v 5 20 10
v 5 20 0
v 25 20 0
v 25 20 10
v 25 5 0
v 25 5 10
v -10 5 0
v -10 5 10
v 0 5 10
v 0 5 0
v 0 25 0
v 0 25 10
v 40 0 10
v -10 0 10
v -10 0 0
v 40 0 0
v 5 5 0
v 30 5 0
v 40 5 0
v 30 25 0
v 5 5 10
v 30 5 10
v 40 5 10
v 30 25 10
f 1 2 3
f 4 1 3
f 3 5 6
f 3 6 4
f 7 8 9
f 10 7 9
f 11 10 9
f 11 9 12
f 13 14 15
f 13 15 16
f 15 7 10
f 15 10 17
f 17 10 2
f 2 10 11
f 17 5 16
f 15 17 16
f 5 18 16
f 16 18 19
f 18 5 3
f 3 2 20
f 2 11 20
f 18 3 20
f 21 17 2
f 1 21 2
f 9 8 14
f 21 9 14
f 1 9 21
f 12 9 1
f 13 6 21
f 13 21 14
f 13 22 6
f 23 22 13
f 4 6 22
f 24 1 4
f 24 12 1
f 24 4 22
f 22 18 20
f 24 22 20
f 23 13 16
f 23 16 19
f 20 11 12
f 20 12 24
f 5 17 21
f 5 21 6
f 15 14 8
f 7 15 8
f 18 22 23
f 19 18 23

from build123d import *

# Parameters (mm, degrees)
SKETCH1_W               = 30
SKETCH1_H               = 25
BOSS_EXTRUDE1_DEPTH     = 10
SKETCH2_W               = 50
SKETCH2_H               = 5
BOSS_EXTRUDE2_DEPTH     = 10
CUT_EXTRUDE1_DEPTH      = 49.218253805
CUT_EXTRUDE1_DEPTH_BACK = 49.218253805
SKETCH3_W               = 20
SKETCH3_H               = 15


with BuildPart() as part:
    # Sketch1 → Boss-Extrude1 (new body)
    with BuildSketch(Plane.XY):
        with Locations((15, 12.5)):
            Rectangle(SKETCH1_W, SKETCH1_H)
    extrude(amount=BOSS_EXTRUDE1_DEPTH)

    # Sketch2 → Boss-Extrude2 (add)
    with BuildSketch(Plane.XY.offset(10)):
        with Locations((15, 2.5)):
            Rectangle(SKETCH2_W, SKETCH2_H)
    extrude(amount=-BOSS_EXTRUDE2_DEPTH)

    # Sketch3 → Cut-Extrude1 (cut, two sides: drawn at the far end of the back side and taken through both)
    with BuildSketch(Plane.XY.offset(10).offset(-CUT_EXTRUDE1_DEPTH_BACK)):
        with Locations((15, 12.5)):
            Rectangle(SKETCH3_W, SKETCH3_H)
    extrude(amount=CUT_EXTRUDE1_DEPTH + CUT_EXTRUDE1_DEPTH_BACK, mode=Mode.SUBTRACT)


solid = part.part
